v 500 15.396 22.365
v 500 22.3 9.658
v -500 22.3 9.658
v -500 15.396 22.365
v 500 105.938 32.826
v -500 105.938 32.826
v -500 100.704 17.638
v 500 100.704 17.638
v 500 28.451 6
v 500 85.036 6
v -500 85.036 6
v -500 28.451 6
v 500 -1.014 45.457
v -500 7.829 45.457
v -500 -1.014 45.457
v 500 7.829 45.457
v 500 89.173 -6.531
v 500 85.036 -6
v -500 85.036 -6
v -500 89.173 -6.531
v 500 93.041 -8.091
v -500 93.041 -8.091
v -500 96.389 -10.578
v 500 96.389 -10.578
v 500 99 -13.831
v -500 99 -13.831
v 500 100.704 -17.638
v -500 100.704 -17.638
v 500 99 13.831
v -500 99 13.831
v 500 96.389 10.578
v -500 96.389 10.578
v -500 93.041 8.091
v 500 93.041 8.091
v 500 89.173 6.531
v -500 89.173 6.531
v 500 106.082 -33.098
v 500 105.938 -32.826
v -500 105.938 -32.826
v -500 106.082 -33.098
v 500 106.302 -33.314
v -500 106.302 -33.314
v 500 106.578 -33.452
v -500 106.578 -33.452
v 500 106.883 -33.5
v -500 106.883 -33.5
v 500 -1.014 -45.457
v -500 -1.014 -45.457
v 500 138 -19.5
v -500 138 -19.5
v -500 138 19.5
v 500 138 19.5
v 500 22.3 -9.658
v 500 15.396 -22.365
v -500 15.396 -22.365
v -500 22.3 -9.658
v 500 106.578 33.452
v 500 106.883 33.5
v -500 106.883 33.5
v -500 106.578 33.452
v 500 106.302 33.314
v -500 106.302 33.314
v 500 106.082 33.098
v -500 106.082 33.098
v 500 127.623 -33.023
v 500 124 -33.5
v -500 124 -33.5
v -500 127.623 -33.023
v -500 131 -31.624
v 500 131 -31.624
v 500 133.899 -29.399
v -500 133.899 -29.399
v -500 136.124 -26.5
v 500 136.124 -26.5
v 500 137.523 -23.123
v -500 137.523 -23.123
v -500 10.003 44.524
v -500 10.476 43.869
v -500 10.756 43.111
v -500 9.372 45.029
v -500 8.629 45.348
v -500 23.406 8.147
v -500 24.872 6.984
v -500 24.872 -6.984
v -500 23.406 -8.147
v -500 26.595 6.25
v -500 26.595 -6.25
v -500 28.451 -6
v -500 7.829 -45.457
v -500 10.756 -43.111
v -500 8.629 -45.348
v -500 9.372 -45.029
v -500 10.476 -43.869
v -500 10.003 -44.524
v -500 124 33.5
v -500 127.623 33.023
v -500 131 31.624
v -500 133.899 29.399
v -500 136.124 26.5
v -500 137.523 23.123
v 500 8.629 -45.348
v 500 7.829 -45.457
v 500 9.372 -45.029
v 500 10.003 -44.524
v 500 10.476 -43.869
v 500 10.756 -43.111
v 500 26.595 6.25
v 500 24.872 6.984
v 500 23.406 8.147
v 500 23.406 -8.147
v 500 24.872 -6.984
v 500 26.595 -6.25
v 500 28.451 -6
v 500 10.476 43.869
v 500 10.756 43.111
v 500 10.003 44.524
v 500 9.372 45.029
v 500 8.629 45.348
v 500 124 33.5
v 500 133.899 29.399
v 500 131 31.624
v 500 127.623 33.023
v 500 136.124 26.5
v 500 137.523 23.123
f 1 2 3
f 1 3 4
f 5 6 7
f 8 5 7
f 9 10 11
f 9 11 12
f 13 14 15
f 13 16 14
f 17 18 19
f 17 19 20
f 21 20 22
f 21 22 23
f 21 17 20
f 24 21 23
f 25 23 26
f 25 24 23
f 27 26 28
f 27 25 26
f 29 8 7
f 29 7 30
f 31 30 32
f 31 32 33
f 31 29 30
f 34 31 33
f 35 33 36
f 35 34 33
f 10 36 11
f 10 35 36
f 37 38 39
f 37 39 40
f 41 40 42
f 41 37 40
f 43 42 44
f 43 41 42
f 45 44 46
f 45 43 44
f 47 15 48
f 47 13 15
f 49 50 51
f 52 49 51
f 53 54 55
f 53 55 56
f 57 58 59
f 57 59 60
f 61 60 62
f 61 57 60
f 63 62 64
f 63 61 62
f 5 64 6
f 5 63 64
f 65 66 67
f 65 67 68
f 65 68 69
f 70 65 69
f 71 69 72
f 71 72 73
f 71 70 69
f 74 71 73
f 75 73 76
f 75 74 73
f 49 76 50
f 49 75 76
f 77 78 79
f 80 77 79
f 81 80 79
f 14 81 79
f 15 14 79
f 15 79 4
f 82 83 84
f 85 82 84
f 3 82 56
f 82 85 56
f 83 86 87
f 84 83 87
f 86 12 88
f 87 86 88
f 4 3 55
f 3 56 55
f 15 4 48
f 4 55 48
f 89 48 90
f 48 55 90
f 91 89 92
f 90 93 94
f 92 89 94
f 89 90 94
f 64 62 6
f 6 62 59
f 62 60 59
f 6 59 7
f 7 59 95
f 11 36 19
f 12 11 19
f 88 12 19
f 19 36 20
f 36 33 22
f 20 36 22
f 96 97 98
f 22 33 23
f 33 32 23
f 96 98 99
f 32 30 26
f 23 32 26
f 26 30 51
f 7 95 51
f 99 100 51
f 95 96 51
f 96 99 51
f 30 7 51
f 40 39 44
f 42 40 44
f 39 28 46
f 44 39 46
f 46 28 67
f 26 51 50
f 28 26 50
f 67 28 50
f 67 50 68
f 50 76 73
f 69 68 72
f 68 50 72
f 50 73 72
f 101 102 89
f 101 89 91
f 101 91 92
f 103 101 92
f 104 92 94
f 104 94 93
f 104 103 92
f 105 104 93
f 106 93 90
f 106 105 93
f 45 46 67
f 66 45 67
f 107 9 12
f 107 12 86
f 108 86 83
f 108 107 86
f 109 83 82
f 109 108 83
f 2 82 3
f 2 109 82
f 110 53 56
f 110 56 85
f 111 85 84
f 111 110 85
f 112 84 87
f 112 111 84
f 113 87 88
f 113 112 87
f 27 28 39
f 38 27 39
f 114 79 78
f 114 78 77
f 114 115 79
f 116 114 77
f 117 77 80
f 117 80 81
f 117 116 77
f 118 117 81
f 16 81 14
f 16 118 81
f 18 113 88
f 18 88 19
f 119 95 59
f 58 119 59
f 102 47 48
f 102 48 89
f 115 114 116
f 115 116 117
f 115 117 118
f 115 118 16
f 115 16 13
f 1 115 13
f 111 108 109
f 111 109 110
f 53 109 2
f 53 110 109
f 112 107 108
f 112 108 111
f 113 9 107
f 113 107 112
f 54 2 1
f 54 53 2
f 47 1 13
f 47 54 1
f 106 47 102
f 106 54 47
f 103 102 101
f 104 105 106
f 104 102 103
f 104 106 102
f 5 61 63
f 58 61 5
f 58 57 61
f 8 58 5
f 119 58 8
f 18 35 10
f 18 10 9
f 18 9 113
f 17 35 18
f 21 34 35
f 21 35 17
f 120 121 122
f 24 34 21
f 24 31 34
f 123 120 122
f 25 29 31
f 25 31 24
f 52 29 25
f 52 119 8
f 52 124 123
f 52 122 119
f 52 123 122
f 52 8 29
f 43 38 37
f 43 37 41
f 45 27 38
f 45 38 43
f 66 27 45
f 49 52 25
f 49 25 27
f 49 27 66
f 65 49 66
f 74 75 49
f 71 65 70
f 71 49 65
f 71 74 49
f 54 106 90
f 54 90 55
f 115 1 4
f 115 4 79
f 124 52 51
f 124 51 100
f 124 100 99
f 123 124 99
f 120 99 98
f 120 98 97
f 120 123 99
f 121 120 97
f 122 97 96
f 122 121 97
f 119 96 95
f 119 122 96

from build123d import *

# Parameters (mm, degrees)
AUFSATZ_LINEAR_AUSTRAGEN1_DEPTH = 500


with BuildPart() as part:
    # Skizze1 → Aufsatz-Linear austragen1 (new body, symmetric)
    with BuildSketch(Plane(origin=(0, 0, 0), x_dir=(0, 0, -1), z_dir=(1, 0, 0))):
        with BuildLine():
            Line((-45.456738262, -1.013535579), (45.456738262, -1.013535579))
            Line((45.456738262, -1.013535579), (45.456738262, 7.828778751))
            ThreePointArc((45.456738262, 7.828778751), (44.798122061, 9.704391159), (43.111456992, 10.756464421))
            Line((43.111456992, 10.756464421), (22.36480763, 15.396040337))
            Line((22.36480763, 15.396040337), (9.658162352, 22.299803874))
            ThreePointArc((9.658162352, 22.299803874), (6.983652955, 24.872378626), (6, 28.45058603))
            Line((6, 28.45058603), (6, 85.036336881))
            ThreePointArc((6, 85.036336881), (9.227773203, 94.794679734), (17.637809302, 100.703577084))
            Line((17.637809302, 100.703577084), (32.825814996, 105.937662587))
            ThreePointArc((32.825814996, 105.937662587), (33.314191315, 106.302499454), (33.5, 106.883096132))
            Line((33.5, 106.883096132), (33.5, 124))
            ThreePointArc((33.5, 124), (29.399494937, 133.899494937), (19.5, 138))
            Line((19.5, 138), (-19.5, 138))
            ThreePointArc((-19.5, 138), (-29.399494937, 133.899494937), (-33.5, 124))
            Line((-33.5, 124), (-33.5, 106.883096132))
            ThreePointArc((-33.5, 106.883096132), (-33.314191315, 106.302499454), (-32.825814996, 105.937662587))
            Line((-32.825814996, 105.937662587), (-17.637809302, 100.703577084))
            ThreePointArc((-17.637809302, 100.703577084), (-9.227773203, 94.794679734), (-6, 85.036336881))
            Line((-6, 85.036336881), (-6, 28.45058603))
            ThreePointArc((-6, 28.45058603), (-6.983652955, 24.872378626), (-9.658162352, 22.299803874))
            Line((-9.658162352, 22.299803874), (-22.36480763, 15.396040337))
            Line((-22.36480763, 15.396040337), (-43.111456992, 10.756464421))
            ThreePointArc((-43.111456992, 10.756464421), (-44.798122061, 9.704391159), (-45.456738262, 7.828778751))
            Line((-45.456738262, 7.828778751), (-45.456738262, -1.013535579))
        make_face()
    extrude(amount=AUFSATZ_LINEAR_AUSTRAGEN1_DEPTH, both=True)


solid = part.part
